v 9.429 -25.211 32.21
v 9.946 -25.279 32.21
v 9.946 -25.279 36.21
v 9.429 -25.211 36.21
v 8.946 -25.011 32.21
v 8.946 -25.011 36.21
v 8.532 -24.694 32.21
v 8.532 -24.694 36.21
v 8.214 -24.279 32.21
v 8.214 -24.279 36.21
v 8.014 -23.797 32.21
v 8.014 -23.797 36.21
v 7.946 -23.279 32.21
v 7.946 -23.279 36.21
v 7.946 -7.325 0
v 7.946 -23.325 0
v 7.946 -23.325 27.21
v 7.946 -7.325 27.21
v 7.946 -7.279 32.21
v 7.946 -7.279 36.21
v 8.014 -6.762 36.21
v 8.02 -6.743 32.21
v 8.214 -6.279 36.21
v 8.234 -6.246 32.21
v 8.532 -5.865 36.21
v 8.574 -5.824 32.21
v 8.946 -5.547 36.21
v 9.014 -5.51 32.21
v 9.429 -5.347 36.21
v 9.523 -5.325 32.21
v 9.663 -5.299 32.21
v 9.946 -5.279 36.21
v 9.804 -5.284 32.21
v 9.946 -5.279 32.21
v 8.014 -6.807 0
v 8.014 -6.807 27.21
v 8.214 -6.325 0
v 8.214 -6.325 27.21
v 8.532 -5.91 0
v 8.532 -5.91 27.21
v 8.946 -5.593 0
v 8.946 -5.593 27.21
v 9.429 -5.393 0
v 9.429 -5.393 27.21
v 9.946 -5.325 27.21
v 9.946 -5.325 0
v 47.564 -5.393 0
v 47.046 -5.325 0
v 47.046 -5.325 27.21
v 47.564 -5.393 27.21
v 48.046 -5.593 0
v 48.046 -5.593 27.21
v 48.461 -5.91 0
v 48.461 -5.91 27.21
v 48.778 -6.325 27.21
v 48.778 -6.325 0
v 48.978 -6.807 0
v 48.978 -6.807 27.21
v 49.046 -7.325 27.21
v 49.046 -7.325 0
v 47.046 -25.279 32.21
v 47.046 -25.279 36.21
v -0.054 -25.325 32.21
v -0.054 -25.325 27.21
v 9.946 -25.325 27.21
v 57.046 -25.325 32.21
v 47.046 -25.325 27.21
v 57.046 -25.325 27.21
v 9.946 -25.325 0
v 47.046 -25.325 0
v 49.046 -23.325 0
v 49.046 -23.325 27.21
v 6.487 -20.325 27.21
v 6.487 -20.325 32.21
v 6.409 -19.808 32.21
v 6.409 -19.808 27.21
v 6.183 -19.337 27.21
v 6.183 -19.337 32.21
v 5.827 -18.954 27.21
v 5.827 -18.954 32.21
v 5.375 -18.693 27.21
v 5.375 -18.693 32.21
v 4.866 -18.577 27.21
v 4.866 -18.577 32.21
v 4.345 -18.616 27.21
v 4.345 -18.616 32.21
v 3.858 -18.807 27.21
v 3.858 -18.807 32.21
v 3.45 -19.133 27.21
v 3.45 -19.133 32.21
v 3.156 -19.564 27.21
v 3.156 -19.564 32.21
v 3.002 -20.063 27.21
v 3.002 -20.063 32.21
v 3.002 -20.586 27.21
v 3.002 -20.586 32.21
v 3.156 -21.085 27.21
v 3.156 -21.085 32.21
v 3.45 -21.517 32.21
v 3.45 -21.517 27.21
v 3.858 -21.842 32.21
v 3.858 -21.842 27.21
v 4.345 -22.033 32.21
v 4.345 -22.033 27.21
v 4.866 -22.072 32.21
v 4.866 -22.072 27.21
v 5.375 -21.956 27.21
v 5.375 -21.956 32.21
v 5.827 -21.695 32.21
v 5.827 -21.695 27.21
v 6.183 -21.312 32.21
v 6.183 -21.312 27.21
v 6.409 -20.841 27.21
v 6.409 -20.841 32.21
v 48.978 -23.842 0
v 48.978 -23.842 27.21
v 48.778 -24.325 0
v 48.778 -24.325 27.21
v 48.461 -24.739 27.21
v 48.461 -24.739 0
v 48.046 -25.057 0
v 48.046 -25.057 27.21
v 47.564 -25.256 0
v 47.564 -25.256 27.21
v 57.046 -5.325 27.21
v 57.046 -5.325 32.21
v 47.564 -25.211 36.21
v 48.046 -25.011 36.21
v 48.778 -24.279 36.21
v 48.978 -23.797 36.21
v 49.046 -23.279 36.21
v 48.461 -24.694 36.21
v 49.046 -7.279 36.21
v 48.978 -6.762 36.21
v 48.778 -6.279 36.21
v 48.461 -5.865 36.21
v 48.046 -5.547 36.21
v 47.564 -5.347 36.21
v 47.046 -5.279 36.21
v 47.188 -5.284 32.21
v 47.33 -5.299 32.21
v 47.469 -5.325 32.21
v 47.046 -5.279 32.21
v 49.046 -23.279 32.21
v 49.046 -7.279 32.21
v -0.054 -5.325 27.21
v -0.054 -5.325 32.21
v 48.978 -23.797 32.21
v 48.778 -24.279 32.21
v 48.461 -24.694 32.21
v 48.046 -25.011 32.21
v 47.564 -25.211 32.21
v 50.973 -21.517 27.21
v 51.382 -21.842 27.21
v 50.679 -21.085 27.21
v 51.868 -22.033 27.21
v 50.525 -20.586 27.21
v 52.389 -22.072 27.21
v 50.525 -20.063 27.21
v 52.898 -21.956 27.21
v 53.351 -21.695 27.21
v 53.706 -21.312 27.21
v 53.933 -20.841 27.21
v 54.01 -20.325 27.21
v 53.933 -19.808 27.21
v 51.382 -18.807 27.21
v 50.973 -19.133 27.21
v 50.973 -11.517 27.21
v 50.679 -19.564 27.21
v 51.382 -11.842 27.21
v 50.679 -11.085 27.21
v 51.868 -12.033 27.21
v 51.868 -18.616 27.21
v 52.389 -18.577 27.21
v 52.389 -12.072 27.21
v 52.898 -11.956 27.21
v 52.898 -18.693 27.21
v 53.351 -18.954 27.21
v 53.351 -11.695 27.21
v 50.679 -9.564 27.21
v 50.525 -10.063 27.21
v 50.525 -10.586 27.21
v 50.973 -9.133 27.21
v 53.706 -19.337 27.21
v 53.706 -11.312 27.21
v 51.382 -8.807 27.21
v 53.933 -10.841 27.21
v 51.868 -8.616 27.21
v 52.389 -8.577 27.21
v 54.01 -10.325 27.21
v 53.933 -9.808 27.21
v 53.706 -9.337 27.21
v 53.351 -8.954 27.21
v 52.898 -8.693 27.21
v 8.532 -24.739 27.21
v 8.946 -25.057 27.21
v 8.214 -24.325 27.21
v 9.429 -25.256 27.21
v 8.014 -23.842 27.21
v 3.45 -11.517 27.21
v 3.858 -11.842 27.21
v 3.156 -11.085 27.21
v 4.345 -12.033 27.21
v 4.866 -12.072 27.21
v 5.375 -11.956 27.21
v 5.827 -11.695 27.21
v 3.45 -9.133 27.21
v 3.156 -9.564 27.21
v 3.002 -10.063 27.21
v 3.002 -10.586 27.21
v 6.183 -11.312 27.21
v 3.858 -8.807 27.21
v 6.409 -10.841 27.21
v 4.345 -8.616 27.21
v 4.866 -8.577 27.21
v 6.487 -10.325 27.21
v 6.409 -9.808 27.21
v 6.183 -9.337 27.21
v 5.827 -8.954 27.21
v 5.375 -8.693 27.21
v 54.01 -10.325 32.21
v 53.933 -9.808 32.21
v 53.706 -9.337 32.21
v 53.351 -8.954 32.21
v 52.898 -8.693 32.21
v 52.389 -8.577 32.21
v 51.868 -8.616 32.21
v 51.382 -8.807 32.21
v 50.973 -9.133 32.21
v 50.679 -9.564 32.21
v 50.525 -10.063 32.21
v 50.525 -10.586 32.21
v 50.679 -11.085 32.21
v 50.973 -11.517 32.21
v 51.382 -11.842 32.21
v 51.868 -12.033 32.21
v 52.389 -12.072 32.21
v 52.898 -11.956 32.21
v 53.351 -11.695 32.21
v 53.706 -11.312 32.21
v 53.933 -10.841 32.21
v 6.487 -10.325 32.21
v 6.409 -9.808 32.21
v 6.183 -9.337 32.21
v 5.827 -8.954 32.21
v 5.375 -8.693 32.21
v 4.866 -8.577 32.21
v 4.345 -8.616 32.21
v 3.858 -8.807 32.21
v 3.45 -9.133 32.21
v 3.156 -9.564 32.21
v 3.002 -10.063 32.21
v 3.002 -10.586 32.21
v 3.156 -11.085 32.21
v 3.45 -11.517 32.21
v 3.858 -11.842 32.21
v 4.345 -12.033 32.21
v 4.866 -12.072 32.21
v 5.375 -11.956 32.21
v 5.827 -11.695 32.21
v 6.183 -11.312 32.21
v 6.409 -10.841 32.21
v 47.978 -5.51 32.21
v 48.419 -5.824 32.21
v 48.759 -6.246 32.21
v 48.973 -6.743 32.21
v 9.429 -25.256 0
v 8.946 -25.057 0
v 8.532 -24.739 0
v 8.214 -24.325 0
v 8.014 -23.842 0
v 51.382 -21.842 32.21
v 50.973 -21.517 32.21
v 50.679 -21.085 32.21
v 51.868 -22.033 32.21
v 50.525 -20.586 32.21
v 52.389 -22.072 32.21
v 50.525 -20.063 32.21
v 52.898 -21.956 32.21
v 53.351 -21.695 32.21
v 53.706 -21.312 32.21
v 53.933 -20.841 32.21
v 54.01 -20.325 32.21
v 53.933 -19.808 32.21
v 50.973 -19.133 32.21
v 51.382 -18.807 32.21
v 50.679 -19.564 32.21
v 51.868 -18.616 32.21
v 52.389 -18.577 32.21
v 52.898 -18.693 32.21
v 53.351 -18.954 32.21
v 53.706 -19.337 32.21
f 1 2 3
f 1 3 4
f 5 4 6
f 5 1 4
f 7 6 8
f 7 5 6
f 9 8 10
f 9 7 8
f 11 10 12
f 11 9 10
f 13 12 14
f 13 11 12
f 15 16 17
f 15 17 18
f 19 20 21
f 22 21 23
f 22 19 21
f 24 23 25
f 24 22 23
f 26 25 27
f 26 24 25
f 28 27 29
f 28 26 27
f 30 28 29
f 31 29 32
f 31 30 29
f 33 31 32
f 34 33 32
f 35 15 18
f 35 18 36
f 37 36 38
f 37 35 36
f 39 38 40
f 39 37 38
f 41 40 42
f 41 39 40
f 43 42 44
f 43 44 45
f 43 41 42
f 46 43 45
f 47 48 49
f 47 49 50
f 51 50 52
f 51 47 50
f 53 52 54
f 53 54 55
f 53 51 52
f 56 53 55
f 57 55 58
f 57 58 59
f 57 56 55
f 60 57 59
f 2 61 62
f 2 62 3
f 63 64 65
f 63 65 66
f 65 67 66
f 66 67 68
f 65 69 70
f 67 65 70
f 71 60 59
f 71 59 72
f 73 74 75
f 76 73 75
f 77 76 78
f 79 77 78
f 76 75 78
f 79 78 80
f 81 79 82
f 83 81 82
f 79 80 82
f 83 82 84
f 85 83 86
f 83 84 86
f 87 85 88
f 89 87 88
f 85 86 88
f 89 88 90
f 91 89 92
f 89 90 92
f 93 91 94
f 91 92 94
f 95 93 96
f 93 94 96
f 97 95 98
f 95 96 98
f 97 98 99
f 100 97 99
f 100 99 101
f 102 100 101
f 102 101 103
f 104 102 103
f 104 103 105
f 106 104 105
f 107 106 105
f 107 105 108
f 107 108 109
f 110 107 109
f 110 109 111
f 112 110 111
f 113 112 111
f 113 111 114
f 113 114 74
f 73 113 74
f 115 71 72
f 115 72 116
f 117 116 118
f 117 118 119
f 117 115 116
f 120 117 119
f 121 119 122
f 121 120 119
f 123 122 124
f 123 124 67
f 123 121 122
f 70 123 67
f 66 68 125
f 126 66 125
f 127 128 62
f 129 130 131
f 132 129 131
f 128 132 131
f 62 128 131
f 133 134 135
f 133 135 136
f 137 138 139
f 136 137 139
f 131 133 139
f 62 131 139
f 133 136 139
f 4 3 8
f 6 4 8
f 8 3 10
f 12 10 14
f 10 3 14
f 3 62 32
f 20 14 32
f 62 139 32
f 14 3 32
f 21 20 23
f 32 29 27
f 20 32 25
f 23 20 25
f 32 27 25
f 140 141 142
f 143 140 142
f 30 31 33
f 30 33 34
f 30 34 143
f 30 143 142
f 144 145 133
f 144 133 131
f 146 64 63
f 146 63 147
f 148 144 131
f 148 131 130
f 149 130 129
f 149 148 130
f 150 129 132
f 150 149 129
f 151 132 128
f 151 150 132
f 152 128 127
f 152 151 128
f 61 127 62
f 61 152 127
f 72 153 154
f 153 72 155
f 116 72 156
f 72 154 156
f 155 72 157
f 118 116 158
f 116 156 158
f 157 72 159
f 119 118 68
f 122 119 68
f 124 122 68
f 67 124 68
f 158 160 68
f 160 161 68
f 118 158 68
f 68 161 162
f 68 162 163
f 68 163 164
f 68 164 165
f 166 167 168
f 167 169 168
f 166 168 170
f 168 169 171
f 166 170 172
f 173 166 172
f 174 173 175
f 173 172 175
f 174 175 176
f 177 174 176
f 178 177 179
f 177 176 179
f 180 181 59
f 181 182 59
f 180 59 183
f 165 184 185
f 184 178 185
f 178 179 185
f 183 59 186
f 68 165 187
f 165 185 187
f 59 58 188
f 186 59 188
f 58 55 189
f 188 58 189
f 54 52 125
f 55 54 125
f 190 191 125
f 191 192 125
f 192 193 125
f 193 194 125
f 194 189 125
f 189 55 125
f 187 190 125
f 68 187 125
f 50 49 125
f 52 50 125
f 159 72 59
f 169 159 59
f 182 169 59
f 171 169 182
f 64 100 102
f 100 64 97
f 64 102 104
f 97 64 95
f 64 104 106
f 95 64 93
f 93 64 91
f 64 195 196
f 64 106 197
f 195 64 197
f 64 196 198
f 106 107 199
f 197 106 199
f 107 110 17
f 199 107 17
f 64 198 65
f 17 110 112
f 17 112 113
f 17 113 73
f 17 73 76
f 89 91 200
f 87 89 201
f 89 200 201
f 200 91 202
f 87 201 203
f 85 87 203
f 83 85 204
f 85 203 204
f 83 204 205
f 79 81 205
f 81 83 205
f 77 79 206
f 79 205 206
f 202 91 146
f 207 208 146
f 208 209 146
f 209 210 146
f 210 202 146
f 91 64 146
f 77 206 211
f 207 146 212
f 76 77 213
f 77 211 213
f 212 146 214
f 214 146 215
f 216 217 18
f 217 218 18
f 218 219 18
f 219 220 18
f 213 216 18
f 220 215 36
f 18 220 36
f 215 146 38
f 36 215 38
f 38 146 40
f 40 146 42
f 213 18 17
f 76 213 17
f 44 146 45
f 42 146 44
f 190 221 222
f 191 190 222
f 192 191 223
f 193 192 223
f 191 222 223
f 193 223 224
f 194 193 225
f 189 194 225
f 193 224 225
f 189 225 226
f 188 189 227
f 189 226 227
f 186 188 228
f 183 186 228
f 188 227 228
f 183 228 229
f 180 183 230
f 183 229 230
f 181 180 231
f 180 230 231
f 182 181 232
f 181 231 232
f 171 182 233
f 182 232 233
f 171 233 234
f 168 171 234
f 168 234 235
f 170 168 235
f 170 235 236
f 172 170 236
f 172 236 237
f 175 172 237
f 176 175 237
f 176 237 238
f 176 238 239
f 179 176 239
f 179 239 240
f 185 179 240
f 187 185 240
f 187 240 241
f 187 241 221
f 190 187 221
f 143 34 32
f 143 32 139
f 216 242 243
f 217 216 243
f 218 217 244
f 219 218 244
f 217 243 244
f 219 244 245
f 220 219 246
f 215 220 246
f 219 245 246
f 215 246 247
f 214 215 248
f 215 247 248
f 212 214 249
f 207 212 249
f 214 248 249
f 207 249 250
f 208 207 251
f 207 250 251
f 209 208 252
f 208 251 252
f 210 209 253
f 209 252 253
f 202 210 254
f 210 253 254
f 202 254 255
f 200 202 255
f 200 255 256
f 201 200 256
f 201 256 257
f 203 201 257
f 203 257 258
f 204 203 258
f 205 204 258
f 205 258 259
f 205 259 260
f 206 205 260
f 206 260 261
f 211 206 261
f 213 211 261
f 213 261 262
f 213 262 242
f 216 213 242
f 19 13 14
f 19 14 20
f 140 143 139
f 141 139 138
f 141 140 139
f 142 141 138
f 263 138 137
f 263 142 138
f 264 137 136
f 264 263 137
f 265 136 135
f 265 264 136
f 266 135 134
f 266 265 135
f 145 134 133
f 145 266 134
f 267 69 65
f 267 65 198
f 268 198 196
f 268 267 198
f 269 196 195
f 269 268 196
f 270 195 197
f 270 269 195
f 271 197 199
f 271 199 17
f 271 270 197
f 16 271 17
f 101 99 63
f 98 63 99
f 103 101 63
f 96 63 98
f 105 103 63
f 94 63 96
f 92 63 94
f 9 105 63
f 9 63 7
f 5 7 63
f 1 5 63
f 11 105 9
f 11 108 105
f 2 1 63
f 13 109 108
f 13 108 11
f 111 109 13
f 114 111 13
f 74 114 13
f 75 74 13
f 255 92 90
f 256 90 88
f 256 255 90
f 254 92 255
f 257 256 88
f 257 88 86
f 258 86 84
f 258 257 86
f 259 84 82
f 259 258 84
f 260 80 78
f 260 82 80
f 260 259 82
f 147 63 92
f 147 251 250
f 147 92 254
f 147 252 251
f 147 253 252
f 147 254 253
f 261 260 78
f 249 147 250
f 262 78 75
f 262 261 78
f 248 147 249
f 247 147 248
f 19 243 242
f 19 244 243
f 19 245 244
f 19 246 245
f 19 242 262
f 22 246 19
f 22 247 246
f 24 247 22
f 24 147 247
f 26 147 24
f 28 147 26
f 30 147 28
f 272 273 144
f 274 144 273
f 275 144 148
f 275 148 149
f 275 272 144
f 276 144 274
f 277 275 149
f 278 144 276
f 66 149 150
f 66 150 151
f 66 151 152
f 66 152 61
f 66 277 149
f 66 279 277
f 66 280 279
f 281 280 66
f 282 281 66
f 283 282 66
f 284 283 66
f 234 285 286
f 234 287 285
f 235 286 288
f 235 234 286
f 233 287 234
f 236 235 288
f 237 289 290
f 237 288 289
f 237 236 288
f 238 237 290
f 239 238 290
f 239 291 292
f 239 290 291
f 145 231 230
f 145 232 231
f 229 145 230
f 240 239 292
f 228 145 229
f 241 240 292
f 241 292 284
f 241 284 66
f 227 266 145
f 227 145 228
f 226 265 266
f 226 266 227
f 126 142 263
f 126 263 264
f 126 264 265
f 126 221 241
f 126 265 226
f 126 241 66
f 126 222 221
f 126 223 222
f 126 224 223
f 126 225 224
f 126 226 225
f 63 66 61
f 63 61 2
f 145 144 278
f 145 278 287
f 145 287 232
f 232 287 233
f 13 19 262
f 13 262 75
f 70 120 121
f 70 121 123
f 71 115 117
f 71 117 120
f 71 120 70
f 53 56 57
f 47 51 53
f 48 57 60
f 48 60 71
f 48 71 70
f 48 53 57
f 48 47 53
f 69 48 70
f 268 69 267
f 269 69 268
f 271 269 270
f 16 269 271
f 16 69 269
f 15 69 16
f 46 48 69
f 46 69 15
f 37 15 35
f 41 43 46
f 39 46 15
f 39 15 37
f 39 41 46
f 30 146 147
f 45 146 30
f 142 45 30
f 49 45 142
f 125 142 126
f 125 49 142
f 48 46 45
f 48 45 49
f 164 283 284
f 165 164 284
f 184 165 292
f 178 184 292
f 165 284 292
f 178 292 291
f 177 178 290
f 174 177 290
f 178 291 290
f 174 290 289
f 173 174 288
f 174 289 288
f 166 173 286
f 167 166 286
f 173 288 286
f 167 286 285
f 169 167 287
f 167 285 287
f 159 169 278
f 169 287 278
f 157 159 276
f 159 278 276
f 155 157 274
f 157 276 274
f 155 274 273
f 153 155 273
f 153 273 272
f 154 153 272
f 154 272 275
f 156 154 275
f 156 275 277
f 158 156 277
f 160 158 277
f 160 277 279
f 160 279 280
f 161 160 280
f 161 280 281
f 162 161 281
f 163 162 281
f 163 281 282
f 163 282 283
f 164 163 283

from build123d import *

# Parameters (mm, degrees)
BOSS_EXTRUDE1_DEPTH = 27.21
SKETCH2_W           = 57.1
SKETCH2_H           = 20
BOSS_EXTRUDE2_DEPTH = 5
BOSS_EXTRUDE3_DEPTH = 4
SKETCH4_R           = 1.752596491
CUT_EXTRUDE1_DEPTH  = 5.63


with BuildPart() as part:
    # Sketch1 → Boss-Extrude1 (new body)
    with BuildSketch(Plane.XY):
        with BuildLine():
            Line((9.946325167, -5.324573125), (47.046325167, -5.324573125))
            ThreePointArc((47.046325167, -5.324573125), (48.460538729, -5.910359563), (49.046325167, -7.324573125))
            Line((49.046325167, -7.324573125), (49.046325167, -23.324573125))
            ThreePointArc((49.046325167, -23.324573125), (48.460538729, -24.738786688), (47.046325167, -25.324573125))
            Line((47.046325167, -25.324573125), (9.946325167, -25.324573125))
            ThreePointArc((9.946325167, -25.324573125), (8.532111605, -24.738786688), (7.946325167, -23.324573125))
            Line((7.946325167, -23.324573125), (7.946325167, -7.324573125))
            ThreePointArc((7.946325167, -7.324573125), (8.532111605, -5.910359563), (9.946325167, -5.324573125))
        make_face()
    extrude(amount=BOSS_EXTRUDE1_DEPTH)

    # Sketch2 → Boss-Extrude2 (add)
    with BuildSketch(Plane.XY.offset(27.21)):
        with Locations((28.496325167, -15.324573125)):
            Rectangle(SKETCH2_W, SKETCH2_H)
    extrude(amount=BOSS_EXTRUDE2_DEPTH)

    # Sketch3 → Boss-Extrude3 (add)
    with BuildSketch(Plane.XY.offset(32.21)):
        with BuildLine():
            Line((9.946325167, -5.279301006), (47.046325167, -5.279301006))
            ThreePointArc((47.046325167, -5.279301006), (48.460538729, -5.865087443), (49.046325167, -7.279301006))
            Line((49.046325167, -7.279301006), (49.046325167, -23.279301006))
            ThreePointArc((49.046325167, -23.279301006), (48.460538729, -24.693514568), (47.046325167, -25.279301006))
            Line((47.046325167, -25.279301006), (9.946325167, -25.279301006))
            ThreePointArc((9.946325167, -25.279301006), (8.532111605, -24.693514568), (7.946325167, -23.279301006))
            Line((7.946325167, -23.279301006), (7.946325167, -7.279301006))
            ThreePointArc((7.946325167, -7.279301006), (8.532111605, -5.865087443), (9.946325167, -5.279301006))
        make_face()
    extrude(amount=BOSS_EXTRUDE3_DEPTH)

    # Sketch4 → Cut-Extrude1 (cut)
    with BuildSketch(Plane.XY.offset(32.21)):
        with Locations((4.734760216, -10.324573125)):
            Circle(SKETCH4_R)
        with Locations((4.734760216, -20.324573125)):
            Circle(SKETCH4_R)
        with Locations((52.257890118, -20.324573125)):
            Circle(SKETCH4_R)
        with Locations((52.257890118, -10.324573125)):
            Circle(SKETCH4_R)
    extrude(amount=-CUT_EXTRUDE1_DEPTH, mode=Mode.SUBTRACT)


solid = part.part
